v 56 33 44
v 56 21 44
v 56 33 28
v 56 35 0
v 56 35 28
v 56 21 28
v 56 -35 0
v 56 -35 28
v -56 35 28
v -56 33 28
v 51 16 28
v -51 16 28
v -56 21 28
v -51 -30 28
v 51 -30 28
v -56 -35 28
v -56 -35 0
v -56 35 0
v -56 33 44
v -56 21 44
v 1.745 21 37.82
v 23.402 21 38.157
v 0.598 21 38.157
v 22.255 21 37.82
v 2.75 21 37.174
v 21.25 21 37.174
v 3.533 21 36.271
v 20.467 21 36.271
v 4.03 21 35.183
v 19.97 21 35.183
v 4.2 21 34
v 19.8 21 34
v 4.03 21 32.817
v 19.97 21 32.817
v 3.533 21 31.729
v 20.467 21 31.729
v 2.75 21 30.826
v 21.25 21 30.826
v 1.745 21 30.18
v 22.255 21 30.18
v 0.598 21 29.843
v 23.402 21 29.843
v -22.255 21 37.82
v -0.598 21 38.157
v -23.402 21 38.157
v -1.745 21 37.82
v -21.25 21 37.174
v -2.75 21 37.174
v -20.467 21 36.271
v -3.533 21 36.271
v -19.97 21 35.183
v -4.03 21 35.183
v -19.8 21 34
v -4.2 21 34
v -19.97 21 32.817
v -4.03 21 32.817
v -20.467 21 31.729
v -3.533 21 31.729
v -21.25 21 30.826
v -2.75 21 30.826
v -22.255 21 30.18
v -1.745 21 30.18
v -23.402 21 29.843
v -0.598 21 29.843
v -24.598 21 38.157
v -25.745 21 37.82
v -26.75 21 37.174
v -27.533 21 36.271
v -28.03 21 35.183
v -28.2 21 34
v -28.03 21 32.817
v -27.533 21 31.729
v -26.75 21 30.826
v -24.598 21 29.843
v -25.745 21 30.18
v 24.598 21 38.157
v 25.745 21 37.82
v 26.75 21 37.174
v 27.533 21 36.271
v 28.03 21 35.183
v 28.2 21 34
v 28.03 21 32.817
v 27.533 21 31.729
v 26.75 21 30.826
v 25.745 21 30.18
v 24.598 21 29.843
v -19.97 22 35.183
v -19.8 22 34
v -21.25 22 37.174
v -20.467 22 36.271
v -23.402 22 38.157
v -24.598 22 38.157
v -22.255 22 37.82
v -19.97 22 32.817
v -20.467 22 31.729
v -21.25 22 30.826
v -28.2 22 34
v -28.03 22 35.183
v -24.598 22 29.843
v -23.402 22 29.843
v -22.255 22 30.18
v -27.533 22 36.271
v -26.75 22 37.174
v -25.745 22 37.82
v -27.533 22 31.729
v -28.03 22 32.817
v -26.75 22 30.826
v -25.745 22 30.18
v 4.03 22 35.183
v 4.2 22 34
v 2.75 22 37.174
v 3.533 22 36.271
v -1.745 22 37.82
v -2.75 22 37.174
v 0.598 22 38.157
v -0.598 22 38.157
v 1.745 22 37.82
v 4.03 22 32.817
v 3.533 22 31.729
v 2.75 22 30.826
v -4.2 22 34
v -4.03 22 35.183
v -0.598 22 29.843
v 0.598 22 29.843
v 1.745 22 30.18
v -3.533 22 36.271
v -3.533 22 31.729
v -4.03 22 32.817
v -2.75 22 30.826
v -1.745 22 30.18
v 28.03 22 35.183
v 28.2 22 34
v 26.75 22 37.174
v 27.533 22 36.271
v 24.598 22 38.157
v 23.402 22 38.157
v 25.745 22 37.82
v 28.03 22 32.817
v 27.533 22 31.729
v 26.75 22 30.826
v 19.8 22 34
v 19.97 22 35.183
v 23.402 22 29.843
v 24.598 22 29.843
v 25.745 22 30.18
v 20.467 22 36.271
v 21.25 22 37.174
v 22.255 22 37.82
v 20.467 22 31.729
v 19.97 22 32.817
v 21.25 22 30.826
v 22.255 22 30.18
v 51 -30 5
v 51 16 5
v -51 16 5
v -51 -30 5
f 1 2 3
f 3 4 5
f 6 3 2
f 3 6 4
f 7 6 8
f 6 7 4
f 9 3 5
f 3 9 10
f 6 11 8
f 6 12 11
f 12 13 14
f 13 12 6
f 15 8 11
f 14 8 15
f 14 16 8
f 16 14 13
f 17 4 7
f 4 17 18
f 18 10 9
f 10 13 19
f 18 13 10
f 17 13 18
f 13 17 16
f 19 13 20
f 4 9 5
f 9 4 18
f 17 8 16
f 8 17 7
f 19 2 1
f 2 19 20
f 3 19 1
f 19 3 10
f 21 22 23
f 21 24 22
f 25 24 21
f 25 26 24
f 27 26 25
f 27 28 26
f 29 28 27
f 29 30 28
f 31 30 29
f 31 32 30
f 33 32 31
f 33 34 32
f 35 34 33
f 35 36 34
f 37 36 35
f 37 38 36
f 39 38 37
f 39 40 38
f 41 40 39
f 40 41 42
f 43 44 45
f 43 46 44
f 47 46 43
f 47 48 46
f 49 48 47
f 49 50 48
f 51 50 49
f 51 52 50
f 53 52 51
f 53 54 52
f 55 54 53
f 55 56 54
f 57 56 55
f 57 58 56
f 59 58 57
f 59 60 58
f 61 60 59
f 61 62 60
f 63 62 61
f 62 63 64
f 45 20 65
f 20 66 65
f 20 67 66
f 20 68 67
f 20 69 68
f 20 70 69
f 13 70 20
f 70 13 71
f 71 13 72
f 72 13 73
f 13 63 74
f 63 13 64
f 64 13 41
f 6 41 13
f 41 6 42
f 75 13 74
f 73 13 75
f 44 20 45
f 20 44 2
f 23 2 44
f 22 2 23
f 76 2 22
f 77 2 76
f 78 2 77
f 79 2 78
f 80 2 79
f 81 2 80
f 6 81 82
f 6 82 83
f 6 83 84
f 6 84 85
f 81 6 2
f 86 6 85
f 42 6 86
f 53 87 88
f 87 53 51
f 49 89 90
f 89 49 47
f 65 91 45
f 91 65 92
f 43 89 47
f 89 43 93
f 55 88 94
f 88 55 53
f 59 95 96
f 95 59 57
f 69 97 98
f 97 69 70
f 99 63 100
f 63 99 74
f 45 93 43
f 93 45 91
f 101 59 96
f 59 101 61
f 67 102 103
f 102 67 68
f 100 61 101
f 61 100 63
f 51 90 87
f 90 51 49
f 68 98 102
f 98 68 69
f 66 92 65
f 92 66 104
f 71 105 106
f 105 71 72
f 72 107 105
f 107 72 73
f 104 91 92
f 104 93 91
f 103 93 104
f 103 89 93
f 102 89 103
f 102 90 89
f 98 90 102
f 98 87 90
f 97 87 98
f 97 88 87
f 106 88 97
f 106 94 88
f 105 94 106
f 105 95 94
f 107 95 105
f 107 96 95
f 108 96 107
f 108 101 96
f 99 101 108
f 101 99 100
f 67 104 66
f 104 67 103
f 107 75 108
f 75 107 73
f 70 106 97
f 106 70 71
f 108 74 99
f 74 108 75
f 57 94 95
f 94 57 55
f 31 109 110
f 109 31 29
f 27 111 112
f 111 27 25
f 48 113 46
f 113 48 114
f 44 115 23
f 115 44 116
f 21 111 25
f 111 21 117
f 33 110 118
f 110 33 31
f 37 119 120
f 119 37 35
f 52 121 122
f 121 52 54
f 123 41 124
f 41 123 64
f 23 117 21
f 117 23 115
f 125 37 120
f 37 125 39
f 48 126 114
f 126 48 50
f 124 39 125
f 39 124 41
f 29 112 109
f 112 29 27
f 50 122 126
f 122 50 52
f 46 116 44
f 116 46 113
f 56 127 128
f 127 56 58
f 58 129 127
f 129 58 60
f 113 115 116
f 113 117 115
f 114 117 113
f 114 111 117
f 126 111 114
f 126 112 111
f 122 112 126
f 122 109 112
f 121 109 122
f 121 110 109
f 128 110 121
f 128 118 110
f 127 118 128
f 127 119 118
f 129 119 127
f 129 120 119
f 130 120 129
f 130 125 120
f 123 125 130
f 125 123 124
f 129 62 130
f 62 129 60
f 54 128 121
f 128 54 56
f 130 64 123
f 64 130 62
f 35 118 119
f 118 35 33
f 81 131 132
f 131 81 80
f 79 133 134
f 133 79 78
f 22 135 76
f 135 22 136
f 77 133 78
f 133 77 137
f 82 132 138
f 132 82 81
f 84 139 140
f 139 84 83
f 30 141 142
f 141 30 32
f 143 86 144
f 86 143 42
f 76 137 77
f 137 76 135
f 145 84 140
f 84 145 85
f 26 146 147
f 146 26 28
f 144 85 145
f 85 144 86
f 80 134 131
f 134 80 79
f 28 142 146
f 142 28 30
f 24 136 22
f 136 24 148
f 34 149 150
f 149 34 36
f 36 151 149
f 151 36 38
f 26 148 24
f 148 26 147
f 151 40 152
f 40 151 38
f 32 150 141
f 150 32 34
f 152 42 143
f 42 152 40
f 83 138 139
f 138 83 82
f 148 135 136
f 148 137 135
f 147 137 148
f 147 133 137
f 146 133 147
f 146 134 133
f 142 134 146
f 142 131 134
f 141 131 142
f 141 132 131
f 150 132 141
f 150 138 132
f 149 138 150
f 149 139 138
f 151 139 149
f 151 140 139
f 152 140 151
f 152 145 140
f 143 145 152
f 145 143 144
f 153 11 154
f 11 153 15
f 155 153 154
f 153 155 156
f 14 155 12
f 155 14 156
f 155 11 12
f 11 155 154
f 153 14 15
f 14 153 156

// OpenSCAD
// file: lib/commerce_forms.scad
// Original parametric printable prototypes. Dimensions in millimeters.
// CAD is the manufacturing authority; Three.js gallery geometry is a stylized preview.
// No external copyrighted silhouettes, brands, logos or character geometry.
$fn=56;
module market_lantern(v=1) {
  r=27+v*2; h=76+v*6; wall=2.8;
  difference() {
    cylinder(r=r,h=h);
    translate([0,0,-1]) cylinder(r=r-wall,h=h+2);
    for (tier=[0:3], j=[0:7+v]) {
      a=360*j/(8+v)+tier*15;
      rotate([0,0,a])
        translate([r-1,0,17+tier*(h-33)/3])
          rotate([0,90,0]) cylinder(r=2.2+(v%3)*.5,h=10,center=true,$fn=18);
    }
  }
}
module market_figurine(v=1) {
  r=18+v;
  union() {
    cylinder(r=29,h=6);
    translate([0,0,7]) scale([1,0.85,1.15]) sphere(r=r);
    translate([0,0,35]) scale([1,.91,.84]) sphere(r=r*.78);
    for (s=[-1,1]) {
      translate([s*(r*.58),0,49])
        rotate([0,s*13,0]) cylinder(r1=5+v*.4,r2=1,h=10+v*2);
      translate([s*(r*.73),-2,20]) scale([.36,.55,.67]) sphere(r=r*.75);
    }
    translate([0,-r*.62,39]) sphere(r=3.5+v*.2);
    for(s=[-1,1])translate([s*7,-r*.72,43])sphere(r=1.8);
  }
}
module market_scenery(v=1) {
  union() {
    translate([-52,-32,0]) cube([104,64,4]);
    for (i=[0:2+v%2]) {
      x=-40+i*24;
      translate([x, -14+(i%2)*12,3.8])
        cube([15+v*2,19,13+v*3]);
      translate([x+2,-13+(i%2)*12,16+v*3])
        cube([11+v*2,15,3]);
    }
    for(i=[-1,1]) {
      translate([i*42,20,3.8]) cylinder(r=5,h=12+v*4);
      translate([i*42,20,15+v*4]) sphere(r=6);
    }
  }
}
module market_organizer(v=1) {
  w=104+v*5;d=69+v*3;h=32+v*3; columns=2+v%3;
  difference() {
    translate([-w/2,-d/2,0]) cube([w,d,h]);
    for(i=[0:columns-1])
      translate([-w/2+3+i*(w-6)/columns,-d/2+3,4])
        cube([(w-6)/columns-3,d-6,h+3]);
  }
}
module market_display(v=1) {
  union() {
    cylinder(r=34+v*2,h=6);
    translate([0,0,5.8]) cylinder(r1=12+v,r2=9,h=26+v*3);
    translate([0,0,30+v*3]) cylinder(r=25+v,h=5);
    for(s=[-1,1])
      translate([s*(16+v),0,34+v*3])
        cube([5,31,10],center=true);
  }
}
module market_gaming(v=1) {
  w=102+v*5;d=66+v*2; h=22+v*3;
  difference() {
    union() {
      translate([-w/2,-d/2,0]) cube([w,d,h]);
      translate([-w/2, d/2-14,h-1]) cube([w,12,15+v]);
    }
    translate([-w/2+5,-d/2+5,5]) cube([w-10,d-24,h+12]);
    for(i=[-1,0,1])
      translate([i*24,d/2-13,h+6]) rotate([90,0,0])
        cylinder(r=3.6+v*.3,h=16,$fn=22);
  }
}
module market_jewelry(v=1) {
  union() {
    translate([-40,-26,0]) cube([80,52,6]);
    for (i=[0:3+v%2]) {
      x=-29+i*58/(3+v%2);
      translate([x,0,5.8]) cylinder(r=3.2,h=42+v*5,$fn=24);
      translate([x,0,46+v*5]) sphere(r=5);
    }
    translate([-33,-5,42+v*5]) cube([66,9,6]);
    for(i=[0:4])translate([-25+i*12,0,46+v*5])
      cylinder(r1=4,r2=1.5,h=7,$fn=20);
  }
}
module market_planter(v=1) {
  r=34+v*2; h=48+v*6; w=3.2;
  difference() {
    union() {
      cylinder(r=r,h=h);
      for(i=[0:9+v])
        rotate([0,0,360*i/(10+v)])
          translate([r-.5,-1.6,2]) cube([2.2,3.2,h-4]);
    }
    translate([0,0,3.8]) cylinder(r=r-w,h=h+2);
    translate([0,0,-1]) cylinder(r=2.8,h=7,$fn=24);
  }
}
module market_gift(v=1,label="CUSTOM") {
  w=100+v*6;d=49+v*3;
  difference() {
    union() {
      hull()for(x=[-w/2+7,w/2-7],y=[-d/2+7,d/2-7])
        translate([x,y,0]) cylinder(r=7,h=6,$fn=24);
      translate([0,0,5.8]) linear_extrude(height=2.2)
        text(label,size=max(9,18-v),halign="center",valign="center",
             font="Liberation Sans:style=Bold");
    }
    if(v==3)for(x=[-w/2+10,w/2-10])
      translate([x,d/2-10,-1]) cylinder(r=2.5,h=10,$fn=24);
  }
}
module market_cosplay(v=1) {
  r=28+v*2;
  difference() {
    union() {
      cylinder(r=r,h=4.5,$fn=8+v*2);
      for(i=[0:4+v])
        rotate([0,0,360*i/(5+v)])
          translate([r*.45,0,4.2]) cylinder(r=4.2,h=1.8,$fn=6);
      cylinder(r=12+v*.5,h=7,$fn=5+v);
    }
    translate([0,r*.70,-1])cylinder(r=3.3,h=10,$fn=24);
  }
}
module commercial_form(family="lantern",variant=1,label="CUSTOM") {
  if(family=="lantern")market_lantern(variant);
  else if(family=="figurine")market_figurine(variant);
  else if(family=="scenery")market_scenery(variant);
  else if(family=="organizer")market_organizer(variant);
  else if(family=="display")market_display(variant);
  else if(family=="gaming")market_gaming(variant);
  else if(family=="jewelry")market_jewelry(variant);
  else if(family=="planter")market_planter(variant);
  else if(family=="gift")market_gift(variant,label);
  else if(family=="cosplay")market_cosplay(variant);
  else assert(false,str("Unknown family: ",family));
}
// main file
// Original 3D printable CAD prototype for Retro Cartridge Rack
// Millimeter units; edit parameters and print-test before commercial shipment.
use <lib/commerce_forms.scad>
commercial_form(family="gaming",variant=2);
